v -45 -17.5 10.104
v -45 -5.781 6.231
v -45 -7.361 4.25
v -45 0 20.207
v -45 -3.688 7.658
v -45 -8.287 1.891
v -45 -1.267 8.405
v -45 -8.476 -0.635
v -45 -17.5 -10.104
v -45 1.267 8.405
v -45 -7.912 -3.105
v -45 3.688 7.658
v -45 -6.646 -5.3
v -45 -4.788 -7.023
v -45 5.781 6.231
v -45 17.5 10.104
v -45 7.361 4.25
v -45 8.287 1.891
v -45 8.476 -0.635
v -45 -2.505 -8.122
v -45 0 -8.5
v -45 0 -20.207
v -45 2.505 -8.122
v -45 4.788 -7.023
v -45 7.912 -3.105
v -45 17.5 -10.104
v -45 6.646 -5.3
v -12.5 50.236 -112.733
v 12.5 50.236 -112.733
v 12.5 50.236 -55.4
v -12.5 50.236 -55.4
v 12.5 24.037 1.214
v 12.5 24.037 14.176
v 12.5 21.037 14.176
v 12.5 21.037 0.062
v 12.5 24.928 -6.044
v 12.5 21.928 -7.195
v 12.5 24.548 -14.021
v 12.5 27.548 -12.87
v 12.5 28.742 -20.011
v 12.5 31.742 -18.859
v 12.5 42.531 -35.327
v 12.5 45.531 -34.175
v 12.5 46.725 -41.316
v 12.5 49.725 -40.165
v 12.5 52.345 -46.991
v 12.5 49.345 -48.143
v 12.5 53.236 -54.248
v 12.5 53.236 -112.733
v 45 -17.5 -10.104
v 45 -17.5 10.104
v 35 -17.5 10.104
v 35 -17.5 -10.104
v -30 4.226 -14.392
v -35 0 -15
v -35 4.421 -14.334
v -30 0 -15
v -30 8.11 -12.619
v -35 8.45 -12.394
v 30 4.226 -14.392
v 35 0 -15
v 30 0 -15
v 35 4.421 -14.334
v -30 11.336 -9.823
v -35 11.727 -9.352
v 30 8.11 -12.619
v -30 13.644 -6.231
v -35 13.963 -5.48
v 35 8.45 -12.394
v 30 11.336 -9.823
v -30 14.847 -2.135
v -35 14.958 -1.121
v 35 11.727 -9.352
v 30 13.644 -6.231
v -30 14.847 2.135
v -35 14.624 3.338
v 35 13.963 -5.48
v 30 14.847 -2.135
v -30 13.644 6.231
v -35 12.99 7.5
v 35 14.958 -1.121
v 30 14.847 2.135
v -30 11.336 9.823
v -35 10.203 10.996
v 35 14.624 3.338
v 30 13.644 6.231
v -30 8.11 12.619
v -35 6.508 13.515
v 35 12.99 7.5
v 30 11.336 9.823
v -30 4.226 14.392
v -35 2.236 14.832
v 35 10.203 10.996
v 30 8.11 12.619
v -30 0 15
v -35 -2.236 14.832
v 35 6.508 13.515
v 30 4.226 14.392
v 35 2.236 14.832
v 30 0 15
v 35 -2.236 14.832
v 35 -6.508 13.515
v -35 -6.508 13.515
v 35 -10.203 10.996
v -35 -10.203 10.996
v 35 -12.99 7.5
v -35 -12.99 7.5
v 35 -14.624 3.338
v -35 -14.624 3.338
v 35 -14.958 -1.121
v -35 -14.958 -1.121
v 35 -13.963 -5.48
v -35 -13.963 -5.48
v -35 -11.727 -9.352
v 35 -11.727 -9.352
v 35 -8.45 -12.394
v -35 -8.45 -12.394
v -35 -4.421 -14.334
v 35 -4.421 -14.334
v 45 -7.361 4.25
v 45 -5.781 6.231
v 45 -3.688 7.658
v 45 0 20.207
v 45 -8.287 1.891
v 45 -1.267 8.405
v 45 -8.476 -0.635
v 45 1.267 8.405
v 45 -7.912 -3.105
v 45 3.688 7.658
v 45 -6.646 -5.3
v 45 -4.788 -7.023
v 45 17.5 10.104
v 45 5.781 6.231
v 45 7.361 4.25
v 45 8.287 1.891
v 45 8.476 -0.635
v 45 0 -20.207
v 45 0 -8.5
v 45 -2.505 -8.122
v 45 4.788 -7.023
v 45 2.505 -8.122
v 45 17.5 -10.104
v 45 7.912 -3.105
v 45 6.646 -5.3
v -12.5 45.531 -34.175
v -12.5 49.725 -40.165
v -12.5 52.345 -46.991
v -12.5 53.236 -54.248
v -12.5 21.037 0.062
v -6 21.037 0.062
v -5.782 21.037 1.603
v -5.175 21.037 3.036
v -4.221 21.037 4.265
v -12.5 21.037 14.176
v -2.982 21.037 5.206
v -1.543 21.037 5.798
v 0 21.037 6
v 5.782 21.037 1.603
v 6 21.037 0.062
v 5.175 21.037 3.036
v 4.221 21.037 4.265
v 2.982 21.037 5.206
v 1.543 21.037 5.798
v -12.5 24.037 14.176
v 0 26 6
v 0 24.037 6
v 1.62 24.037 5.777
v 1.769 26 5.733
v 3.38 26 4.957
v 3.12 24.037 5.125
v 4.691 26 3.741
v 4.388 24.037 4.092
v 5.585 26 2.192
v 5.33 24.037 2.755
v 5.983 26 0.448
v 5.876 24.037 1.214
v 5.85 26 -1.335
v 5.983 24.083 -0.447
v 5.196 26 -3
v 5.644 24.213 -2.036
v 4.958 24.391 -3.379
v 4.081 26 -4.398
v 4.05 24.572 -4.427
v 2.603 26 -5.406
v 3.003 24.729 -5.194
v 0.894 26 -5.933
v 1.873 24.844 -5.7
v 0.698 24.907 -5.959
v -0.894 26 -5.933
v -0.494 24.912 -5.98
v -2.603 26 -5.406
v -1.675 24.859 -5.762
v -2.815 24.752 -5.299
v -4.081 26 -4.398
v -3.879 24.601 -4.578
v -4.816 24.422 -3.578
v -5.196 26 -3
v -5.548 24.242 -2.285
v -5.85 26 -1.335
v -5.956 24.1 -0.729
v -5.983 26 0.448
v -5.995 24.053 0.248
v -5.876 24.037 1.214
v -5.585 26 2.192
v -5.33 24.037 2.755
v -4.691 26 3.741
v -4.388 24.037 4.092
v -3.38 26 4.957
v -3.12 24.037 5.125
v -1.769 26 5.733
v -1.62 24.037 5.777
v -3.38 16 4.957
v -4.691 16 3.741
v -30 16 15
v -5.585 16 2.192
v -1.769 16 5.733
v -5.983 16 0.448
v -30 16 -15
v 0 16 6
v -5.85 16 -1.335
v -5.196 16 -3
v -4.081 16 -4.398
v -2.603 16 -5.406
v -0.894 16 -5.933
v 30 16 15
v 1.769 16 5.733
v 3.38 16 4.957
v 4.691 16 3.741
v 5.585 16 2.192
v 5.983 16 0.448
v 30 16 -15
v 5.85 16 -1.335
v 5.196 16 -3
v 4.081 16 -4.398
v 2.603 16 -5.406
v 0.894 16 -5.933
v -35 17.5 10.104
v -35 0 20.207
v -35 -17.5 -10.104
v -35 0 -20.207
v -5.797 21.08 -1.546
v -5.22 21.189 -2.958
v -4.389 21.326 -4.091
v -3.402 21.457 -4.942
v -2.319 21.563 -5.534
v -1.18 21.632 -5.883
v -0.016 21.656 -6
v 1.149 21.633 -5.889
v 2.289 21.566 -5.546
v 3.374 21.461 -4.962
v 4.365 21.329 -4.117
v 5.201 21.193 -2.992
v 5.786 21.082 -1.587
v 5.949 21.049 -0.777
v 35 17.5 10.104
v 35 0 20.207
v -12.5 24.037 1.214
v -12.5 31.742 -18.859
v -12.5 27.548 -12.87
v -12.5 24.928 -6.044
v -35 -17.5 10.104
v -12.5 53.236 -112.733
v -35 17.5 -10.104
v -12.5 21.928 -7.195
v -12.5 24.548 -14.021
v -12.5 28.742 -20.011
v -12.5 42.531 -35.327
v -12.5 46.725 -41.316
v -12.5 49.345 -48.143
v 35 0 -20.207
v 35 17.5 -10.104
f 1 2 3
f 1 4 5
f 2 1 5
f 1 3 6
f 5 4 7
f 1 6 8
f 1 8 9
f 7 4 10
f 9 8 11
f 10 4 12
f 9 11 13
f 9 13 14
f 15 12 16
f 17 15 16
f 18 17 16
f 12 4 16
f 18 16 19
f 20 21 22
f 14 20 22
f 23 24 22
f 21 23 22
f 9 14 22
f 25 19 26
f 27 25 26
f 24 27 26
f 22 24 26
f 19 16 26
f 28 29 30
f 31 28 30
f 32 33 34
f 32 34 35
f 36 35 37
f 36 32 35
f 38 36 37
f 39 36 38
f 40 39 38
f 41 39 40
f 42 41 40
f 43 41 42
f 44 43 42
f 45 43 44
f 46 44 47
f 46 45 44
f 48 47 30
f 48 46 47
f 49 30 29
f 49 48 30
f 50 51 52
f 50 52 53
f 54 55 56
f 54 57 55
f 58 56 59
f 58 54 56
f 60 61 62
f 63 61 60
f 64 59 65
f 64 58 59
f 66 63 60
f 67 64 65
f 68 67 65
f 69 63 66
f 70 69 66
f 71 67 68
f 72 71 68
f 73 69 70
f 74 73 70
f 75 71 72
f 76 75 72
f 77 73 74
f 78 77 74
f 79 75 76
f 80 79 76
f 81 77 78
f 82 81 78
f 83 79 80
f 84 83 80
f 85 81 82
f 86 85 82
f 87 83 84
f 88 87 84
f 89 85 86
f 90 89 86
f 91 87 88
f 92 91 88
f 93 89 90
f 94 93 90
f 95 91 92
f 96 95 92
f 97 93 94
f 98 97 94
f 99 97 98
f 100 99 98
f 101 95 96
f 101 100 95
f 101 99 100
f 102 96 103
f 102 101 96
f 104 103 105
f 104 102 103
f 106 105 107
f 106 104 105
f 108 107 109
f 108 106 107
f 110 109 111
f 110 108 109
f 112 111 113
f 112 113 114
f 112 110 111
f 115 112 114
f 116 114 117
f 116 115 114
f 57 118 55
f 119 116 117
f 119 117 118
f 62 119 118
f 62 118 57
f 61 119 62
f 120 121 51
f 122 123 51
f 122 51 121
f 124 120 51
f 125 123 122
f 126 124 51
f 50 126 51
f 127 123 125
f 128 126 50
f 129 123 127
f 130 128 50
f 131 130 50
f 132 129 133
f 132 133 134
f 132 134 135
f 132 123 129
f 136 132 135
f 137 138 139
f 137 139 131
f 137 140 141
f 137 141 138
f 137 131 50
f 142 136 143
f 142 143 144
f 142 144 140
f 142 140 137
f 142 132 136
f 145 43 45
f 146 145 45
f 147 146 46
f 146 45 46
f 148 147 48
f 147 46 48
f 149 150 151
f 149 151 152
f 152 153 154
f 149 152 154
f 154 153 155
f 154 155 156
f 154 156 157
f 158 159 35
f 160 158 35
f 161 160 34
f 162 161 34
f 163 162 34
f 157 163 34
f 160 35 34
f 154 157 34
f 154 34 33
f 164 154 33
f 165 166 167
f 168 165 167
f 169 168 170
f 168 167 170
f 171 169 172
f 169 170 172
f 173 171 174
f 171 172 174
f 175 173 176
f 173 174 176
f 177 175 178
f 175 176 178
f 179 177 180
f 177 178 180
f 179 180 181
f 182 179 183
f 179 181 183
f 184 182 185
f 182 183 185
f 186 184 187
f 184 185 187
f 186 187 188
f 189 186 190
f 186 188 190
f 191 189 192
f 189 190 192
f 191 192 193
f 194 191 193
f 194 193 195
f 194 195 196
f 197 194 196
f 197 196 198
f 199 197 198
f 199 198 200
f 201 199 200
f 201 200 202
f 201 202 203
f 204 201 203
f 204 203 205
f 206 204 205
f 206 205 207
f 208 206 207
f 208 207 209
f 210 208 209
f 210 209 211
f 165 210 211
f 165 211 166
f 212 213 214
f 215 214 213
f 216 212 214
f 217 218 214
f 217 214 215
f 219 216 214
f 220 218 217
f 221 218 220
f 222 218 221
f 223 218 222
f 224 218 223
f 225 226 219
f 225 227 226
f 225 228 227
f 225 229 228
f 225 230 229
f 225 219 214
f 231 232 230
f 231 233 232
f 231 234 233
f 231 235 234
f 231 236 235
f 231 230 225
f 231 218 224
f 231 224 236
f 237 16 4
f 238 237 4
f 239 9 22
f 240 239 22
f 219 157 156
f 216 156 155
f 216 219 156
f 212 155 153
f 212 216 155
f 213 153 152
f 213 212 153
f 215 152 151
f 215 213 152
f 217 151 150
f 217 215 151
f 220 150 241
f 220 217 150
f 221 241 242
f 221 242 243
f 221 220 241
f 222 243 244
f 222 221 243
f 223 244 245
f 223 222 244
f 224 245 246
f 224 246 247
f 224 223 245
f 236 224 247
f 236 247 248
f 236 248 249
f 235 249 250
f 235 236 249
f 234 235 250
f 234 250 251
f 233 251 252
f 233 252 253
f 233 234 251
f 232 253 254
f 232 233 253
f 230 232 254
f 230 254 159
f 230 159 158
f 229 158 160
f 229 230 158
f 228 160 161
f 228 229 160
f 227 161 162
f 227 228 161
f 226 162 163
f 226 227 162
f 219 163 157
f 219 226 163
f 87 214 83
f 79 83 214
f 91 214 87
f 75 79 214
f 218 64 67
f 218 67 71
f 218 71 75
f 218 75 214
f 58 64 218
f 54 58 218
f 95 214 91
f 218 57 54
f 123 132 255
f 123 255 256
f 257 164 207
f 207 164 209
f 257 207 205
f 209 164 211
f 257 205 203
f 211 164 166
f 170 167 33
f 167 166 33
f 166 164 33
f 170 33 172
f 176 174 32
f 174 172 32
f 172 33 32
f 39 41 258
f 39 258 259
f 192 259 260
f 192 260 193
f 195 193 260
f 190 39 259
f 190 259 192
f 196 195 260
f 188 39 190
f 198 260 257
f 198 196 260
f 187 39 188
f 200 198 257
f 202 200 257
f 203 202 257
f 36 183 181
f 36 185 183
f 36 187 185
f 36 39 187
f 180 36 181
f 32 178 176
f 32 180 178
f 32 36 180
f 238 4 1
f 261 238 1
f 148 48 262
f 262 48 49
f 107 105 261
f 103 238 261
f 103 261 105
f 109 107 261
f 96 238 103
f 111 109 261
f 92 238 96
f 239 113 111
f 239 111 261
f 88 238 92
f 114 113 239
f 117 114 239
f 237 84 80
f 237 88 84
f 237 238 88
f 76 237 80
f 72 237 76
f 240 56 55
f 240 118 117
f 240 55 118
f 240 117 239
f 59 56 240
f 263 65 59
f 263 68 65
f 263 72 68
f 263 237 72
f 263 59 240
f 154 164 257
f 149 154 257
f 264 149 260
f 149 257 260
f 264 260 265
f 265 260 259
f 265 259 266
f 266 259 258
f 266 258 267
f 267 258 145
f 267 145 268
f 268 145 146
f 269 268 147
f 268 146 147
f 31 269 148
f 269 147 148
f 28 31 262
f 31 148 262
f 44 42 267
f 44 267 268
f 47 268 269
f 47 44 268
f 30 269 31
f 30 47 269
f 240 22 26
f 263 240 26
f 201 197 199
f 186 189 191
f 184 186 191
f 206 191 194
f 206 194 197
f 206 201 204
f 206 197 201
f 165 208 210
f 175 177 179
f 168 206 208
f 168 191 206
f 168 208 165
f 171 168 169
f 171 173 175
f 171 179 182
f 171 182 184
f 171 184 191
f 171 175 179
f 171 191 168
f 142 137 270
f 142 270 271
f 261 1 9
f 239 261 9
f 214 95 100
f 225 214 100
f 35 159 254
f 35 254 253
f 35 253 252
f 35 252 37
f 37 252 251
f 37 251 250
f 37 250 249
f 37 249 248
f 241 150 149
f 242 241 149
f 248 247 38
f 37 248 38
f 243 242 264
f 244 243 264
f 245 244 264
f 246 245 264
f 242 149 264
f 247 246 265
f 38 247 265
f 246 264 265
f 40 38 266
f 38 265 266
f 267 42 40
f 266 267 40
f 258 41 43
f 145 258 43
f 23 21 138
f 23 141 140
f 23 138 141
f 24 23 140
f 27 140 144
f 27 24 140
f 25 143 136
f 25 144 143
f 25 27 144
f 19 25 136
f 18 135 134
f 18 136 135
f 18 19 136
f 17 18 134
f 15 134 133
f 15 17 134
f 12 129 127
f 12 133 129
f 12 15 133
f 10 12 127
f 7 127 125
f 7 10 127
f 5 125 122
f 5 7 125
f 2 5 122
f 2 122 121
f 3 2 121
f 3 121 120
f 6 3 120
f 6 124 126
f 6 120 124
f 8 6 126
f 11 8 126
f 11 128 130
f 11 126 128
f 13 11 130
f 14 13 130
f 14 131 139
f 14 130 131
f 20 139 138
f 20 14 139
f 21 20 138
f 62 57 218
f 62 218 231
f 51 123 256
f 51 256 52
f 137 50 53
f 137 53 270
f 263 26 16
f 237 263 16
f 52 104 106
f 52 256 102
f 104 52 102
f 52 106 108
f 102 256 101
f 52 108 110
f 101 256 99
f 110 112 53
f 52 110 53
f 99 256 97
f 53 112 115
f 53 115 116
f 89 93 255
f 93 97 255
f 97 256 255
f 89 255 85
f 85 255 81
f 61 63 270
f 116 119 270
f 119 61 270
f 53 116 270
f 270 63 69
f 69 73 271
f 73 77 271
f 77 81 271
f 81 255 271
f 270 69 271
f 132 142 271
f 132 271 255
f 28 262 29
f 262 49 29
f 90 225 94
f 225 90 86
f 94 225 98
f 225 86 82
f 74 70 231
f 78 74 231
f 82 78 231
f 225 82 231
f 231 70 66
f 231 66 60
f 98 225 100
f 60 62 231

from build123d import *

# Parameters (mm, degrees)
SKETCH1_R               = 15
SKETCH1_R_2             = 5
EXTRUDE_THIN1_DEPTH     = 45
SKETCH2_W               = 60
SKETCH2_H               = 30
BOSS_EXTRUDE1_DEPTH     = 16
SKETCH3_R               = 6
BOSS_EXTRUDE2_DEPTH     = 10
EXTRUDE_THIN2_DEPTH     = 12.5
FILLET1_R               = 30
BOSS_EXTRUDE3_DEPTH     = 10
CUT_EXTRUDE1_DEPTH      = 133.543633763
CUT_EXTRUDE1_DEPTH_BACK = 133.543633763
SKETCH6_R               = 8.5


with BuildPart() as part:
    # Sketch1 → Extrude-Thin1 (new, symmetric)
    with BuildSketch(Plane(origin=(0, 0, 0), x_dir=(0, 0, -1), z_dir=(1, 0, 0))):
        Circle(SKETCH1_R)
        Circle(SKETCH1_R_2, mode=Mode.SUBTRACT)
    extrude(amount=EXTRUDE_THIN1_DEPTH, both=True)

    # Sketch2 → Boss-Extrude1 (add)
    with BuildSketch(Plane(origin=(0, 0, 0), x_dir=(1, 0, 0), z_dir=(0, 1, 0))):
        Rectangle(SKETCH2_W, SKETCH2_H)
    extrude(amount=BOSS_EXTRUDE1_DEPTH)

    # Sketch3 → Boss-Extrude2 (add)
    with BuildSketch(Plane(origin=(0, 16, 0), x_dir=(1, 0, 0), z_dir=(0, 1, 0))):
        with Locations(Location((0, 0, 0), (0, 0, 270))):
            Circle(SKETCH3_R)
    extrude(amount=BOSS_EXTRUDE2_DEPTH)

    # Sketch4 → Extrude-Thin2 (add, symmetric)
    with BuildSketch(Plane(origin=(0, 0, 0), x_dir=(0, 0, -1), z_dir=(1, 0, 0))):
        Polygon((-14.175668382, 24.036944014), (10.301514998, 24.036944014), (42.733043078, 53.23603901), (112.733043078, 53.23603901), (112.733043078, 50.23603901), (43.884565313, 50.23603901), (11.453037232, 21.036944014), (-14.175668382, 21.036944014), align=None)
    extrude(amount=EXTRUDE_THIN2_DEPTH, both=True)

    # Fillet1
    # the kernel refuses this fillet: 30 mm, written as the material it adds along each edge
    with BuildSketch(Plane(origin=(12.5, 50.23603901, -43.884565313), x_dir=(0, -0.6691004351822666, 0.7431719906178524), z_dir=(-1, 0, 0))) as fillet1_piece_1:
        with BuildLine():
            CenterArc((FILLET1_R * 0.383840744794, -FILLET1_R), FILLET1_R, 90, 41.997673873)
            Line((-FILLET1_R * 0.285259690389, -FILLET1_R * 0.256828009382), (0, 0))
            Line((0, 0), (FILLET1_R * 0.383840744794, 0))
        make_face()
    extrude(amount=25)
    with BuildSketch(Plane(origin=(12.5, 24.036944014, -10.301514998), x_dir=(0, 0, 1), z_dir=(-1, 0, 0))) as fillet1_piece_2:
        with BuildLine():
            CenterArc((FILLET1_R * 0.383840744794, FILLET1_R), FILLET1_R, 228.002326127, 41.997673873)
            Line((-FILLET1_R * 0.285259690389, FILLET1_R * 0.256828009382), (0, 0))
            Line((0, 0), (FILLET1_R * 0.383840744794, 0))
        make_face()
    extrude(amount=25)
    # the kernel refuses this fillet: 30 mm, written as the material it takes off along each edge
    with BuildSketch(Plane(origin=(41.28805586, 53.23603901, -42.733043078), x_dir=(0, -0.6691004351822663, 0.7431719906178528), z_dir=(-1, 0, 0))) as fillet1_2_piece_1:
        with BuildLine():
            CenterArc((FILLET1_R * 0.383840744794, -FILLET1_R), FILLET1_R, 90, 41.997673873)
            Line((-FILLET1_R * 0.285259690389, -FILLET1_R * 0.256828009382), (0, 0))
            Line((0, 0), (FILLET1_R * 0.383840744794, 0))
        make_face()
    extrude(amount=82.576111719, mode=Mode.SUBTRACT)
    with BuildSketch(Plane(origin=(-41.28805586, 21.036944014, -11.453037232), x_dir=(0, 0, 1), z_dir=(1, 0, 0))) as fillet1_2_piece_2_section:
        with BuildLine():
            CenterArc((FILLET1_R * 0.383840744794, -FILLET1_R), FILLET1_R, 90, 41.997673873)
            Line((-FILLET1_R * 0.285259690389, -FILLET1_R * 0.256828009382), (0, 0))
            Line((0, 0), (FILLET1_R * 0.383840744794, 0))
        make_face()
    fillet1_2_piece_2 = extrude(amount=82.576111719, mode=Mode.PRIVATE)
    fillet1_2_piece_2 = fillet1_2_piece_2 - Plane(origin=(0, 22.678661346, 0), x_dir=(0, 0, 1), z_dir=(0, -1, 0)) * Cylinder(6, 212, mode=Mode.PRIVATE)
    add(fillet1_2_piece_2, mode=Mode.SUBTRACT)

    # Sketch5 → Boss-Extrude3 (add)
    with BuildSketch(Plane(origin=(45, 0, 0), x_dir=(0, 0, -1), z_dir=(1, 0, 0))):
        Polygon((-20.207259422, 0), (-10.103629711, -17.5), (10.103629711, -17.5), (20.207259422, 0), (10.103629711, 17.5), (-10.103629711, 17.5), align=None)
    boss_extrude3 = extrude(amount=-BOSS_EXTRUDE3_DEPTH)

    # Mirror1: Boss-Extrude3 across plane
    add(boss_extrude3.mirror(Plane(origin=(0, 0, 0), x_dir=(0, 0, 1), z_dir=(1, 0, 0))))

    # Sketch6 → Cut-Extrude1 (cut, two sides: drawn at the far end of the back side and taken through both)
    with BuildSketch(Plane(origin=(0, 0, 0), x_dir=(0, 0, -1), z_dir=(1, 0, 0)).offset(-CUT_EXTRUDE1_DEPTH_BACK)):
        Circle(SKETCH6_R)
    extrude(amount=CUT_EXTRUDE1_DEPTH + CUT_EXTRUDE1_DEPTH_BACK, mode=Mode.SUBTRACT)


solid = part.part
